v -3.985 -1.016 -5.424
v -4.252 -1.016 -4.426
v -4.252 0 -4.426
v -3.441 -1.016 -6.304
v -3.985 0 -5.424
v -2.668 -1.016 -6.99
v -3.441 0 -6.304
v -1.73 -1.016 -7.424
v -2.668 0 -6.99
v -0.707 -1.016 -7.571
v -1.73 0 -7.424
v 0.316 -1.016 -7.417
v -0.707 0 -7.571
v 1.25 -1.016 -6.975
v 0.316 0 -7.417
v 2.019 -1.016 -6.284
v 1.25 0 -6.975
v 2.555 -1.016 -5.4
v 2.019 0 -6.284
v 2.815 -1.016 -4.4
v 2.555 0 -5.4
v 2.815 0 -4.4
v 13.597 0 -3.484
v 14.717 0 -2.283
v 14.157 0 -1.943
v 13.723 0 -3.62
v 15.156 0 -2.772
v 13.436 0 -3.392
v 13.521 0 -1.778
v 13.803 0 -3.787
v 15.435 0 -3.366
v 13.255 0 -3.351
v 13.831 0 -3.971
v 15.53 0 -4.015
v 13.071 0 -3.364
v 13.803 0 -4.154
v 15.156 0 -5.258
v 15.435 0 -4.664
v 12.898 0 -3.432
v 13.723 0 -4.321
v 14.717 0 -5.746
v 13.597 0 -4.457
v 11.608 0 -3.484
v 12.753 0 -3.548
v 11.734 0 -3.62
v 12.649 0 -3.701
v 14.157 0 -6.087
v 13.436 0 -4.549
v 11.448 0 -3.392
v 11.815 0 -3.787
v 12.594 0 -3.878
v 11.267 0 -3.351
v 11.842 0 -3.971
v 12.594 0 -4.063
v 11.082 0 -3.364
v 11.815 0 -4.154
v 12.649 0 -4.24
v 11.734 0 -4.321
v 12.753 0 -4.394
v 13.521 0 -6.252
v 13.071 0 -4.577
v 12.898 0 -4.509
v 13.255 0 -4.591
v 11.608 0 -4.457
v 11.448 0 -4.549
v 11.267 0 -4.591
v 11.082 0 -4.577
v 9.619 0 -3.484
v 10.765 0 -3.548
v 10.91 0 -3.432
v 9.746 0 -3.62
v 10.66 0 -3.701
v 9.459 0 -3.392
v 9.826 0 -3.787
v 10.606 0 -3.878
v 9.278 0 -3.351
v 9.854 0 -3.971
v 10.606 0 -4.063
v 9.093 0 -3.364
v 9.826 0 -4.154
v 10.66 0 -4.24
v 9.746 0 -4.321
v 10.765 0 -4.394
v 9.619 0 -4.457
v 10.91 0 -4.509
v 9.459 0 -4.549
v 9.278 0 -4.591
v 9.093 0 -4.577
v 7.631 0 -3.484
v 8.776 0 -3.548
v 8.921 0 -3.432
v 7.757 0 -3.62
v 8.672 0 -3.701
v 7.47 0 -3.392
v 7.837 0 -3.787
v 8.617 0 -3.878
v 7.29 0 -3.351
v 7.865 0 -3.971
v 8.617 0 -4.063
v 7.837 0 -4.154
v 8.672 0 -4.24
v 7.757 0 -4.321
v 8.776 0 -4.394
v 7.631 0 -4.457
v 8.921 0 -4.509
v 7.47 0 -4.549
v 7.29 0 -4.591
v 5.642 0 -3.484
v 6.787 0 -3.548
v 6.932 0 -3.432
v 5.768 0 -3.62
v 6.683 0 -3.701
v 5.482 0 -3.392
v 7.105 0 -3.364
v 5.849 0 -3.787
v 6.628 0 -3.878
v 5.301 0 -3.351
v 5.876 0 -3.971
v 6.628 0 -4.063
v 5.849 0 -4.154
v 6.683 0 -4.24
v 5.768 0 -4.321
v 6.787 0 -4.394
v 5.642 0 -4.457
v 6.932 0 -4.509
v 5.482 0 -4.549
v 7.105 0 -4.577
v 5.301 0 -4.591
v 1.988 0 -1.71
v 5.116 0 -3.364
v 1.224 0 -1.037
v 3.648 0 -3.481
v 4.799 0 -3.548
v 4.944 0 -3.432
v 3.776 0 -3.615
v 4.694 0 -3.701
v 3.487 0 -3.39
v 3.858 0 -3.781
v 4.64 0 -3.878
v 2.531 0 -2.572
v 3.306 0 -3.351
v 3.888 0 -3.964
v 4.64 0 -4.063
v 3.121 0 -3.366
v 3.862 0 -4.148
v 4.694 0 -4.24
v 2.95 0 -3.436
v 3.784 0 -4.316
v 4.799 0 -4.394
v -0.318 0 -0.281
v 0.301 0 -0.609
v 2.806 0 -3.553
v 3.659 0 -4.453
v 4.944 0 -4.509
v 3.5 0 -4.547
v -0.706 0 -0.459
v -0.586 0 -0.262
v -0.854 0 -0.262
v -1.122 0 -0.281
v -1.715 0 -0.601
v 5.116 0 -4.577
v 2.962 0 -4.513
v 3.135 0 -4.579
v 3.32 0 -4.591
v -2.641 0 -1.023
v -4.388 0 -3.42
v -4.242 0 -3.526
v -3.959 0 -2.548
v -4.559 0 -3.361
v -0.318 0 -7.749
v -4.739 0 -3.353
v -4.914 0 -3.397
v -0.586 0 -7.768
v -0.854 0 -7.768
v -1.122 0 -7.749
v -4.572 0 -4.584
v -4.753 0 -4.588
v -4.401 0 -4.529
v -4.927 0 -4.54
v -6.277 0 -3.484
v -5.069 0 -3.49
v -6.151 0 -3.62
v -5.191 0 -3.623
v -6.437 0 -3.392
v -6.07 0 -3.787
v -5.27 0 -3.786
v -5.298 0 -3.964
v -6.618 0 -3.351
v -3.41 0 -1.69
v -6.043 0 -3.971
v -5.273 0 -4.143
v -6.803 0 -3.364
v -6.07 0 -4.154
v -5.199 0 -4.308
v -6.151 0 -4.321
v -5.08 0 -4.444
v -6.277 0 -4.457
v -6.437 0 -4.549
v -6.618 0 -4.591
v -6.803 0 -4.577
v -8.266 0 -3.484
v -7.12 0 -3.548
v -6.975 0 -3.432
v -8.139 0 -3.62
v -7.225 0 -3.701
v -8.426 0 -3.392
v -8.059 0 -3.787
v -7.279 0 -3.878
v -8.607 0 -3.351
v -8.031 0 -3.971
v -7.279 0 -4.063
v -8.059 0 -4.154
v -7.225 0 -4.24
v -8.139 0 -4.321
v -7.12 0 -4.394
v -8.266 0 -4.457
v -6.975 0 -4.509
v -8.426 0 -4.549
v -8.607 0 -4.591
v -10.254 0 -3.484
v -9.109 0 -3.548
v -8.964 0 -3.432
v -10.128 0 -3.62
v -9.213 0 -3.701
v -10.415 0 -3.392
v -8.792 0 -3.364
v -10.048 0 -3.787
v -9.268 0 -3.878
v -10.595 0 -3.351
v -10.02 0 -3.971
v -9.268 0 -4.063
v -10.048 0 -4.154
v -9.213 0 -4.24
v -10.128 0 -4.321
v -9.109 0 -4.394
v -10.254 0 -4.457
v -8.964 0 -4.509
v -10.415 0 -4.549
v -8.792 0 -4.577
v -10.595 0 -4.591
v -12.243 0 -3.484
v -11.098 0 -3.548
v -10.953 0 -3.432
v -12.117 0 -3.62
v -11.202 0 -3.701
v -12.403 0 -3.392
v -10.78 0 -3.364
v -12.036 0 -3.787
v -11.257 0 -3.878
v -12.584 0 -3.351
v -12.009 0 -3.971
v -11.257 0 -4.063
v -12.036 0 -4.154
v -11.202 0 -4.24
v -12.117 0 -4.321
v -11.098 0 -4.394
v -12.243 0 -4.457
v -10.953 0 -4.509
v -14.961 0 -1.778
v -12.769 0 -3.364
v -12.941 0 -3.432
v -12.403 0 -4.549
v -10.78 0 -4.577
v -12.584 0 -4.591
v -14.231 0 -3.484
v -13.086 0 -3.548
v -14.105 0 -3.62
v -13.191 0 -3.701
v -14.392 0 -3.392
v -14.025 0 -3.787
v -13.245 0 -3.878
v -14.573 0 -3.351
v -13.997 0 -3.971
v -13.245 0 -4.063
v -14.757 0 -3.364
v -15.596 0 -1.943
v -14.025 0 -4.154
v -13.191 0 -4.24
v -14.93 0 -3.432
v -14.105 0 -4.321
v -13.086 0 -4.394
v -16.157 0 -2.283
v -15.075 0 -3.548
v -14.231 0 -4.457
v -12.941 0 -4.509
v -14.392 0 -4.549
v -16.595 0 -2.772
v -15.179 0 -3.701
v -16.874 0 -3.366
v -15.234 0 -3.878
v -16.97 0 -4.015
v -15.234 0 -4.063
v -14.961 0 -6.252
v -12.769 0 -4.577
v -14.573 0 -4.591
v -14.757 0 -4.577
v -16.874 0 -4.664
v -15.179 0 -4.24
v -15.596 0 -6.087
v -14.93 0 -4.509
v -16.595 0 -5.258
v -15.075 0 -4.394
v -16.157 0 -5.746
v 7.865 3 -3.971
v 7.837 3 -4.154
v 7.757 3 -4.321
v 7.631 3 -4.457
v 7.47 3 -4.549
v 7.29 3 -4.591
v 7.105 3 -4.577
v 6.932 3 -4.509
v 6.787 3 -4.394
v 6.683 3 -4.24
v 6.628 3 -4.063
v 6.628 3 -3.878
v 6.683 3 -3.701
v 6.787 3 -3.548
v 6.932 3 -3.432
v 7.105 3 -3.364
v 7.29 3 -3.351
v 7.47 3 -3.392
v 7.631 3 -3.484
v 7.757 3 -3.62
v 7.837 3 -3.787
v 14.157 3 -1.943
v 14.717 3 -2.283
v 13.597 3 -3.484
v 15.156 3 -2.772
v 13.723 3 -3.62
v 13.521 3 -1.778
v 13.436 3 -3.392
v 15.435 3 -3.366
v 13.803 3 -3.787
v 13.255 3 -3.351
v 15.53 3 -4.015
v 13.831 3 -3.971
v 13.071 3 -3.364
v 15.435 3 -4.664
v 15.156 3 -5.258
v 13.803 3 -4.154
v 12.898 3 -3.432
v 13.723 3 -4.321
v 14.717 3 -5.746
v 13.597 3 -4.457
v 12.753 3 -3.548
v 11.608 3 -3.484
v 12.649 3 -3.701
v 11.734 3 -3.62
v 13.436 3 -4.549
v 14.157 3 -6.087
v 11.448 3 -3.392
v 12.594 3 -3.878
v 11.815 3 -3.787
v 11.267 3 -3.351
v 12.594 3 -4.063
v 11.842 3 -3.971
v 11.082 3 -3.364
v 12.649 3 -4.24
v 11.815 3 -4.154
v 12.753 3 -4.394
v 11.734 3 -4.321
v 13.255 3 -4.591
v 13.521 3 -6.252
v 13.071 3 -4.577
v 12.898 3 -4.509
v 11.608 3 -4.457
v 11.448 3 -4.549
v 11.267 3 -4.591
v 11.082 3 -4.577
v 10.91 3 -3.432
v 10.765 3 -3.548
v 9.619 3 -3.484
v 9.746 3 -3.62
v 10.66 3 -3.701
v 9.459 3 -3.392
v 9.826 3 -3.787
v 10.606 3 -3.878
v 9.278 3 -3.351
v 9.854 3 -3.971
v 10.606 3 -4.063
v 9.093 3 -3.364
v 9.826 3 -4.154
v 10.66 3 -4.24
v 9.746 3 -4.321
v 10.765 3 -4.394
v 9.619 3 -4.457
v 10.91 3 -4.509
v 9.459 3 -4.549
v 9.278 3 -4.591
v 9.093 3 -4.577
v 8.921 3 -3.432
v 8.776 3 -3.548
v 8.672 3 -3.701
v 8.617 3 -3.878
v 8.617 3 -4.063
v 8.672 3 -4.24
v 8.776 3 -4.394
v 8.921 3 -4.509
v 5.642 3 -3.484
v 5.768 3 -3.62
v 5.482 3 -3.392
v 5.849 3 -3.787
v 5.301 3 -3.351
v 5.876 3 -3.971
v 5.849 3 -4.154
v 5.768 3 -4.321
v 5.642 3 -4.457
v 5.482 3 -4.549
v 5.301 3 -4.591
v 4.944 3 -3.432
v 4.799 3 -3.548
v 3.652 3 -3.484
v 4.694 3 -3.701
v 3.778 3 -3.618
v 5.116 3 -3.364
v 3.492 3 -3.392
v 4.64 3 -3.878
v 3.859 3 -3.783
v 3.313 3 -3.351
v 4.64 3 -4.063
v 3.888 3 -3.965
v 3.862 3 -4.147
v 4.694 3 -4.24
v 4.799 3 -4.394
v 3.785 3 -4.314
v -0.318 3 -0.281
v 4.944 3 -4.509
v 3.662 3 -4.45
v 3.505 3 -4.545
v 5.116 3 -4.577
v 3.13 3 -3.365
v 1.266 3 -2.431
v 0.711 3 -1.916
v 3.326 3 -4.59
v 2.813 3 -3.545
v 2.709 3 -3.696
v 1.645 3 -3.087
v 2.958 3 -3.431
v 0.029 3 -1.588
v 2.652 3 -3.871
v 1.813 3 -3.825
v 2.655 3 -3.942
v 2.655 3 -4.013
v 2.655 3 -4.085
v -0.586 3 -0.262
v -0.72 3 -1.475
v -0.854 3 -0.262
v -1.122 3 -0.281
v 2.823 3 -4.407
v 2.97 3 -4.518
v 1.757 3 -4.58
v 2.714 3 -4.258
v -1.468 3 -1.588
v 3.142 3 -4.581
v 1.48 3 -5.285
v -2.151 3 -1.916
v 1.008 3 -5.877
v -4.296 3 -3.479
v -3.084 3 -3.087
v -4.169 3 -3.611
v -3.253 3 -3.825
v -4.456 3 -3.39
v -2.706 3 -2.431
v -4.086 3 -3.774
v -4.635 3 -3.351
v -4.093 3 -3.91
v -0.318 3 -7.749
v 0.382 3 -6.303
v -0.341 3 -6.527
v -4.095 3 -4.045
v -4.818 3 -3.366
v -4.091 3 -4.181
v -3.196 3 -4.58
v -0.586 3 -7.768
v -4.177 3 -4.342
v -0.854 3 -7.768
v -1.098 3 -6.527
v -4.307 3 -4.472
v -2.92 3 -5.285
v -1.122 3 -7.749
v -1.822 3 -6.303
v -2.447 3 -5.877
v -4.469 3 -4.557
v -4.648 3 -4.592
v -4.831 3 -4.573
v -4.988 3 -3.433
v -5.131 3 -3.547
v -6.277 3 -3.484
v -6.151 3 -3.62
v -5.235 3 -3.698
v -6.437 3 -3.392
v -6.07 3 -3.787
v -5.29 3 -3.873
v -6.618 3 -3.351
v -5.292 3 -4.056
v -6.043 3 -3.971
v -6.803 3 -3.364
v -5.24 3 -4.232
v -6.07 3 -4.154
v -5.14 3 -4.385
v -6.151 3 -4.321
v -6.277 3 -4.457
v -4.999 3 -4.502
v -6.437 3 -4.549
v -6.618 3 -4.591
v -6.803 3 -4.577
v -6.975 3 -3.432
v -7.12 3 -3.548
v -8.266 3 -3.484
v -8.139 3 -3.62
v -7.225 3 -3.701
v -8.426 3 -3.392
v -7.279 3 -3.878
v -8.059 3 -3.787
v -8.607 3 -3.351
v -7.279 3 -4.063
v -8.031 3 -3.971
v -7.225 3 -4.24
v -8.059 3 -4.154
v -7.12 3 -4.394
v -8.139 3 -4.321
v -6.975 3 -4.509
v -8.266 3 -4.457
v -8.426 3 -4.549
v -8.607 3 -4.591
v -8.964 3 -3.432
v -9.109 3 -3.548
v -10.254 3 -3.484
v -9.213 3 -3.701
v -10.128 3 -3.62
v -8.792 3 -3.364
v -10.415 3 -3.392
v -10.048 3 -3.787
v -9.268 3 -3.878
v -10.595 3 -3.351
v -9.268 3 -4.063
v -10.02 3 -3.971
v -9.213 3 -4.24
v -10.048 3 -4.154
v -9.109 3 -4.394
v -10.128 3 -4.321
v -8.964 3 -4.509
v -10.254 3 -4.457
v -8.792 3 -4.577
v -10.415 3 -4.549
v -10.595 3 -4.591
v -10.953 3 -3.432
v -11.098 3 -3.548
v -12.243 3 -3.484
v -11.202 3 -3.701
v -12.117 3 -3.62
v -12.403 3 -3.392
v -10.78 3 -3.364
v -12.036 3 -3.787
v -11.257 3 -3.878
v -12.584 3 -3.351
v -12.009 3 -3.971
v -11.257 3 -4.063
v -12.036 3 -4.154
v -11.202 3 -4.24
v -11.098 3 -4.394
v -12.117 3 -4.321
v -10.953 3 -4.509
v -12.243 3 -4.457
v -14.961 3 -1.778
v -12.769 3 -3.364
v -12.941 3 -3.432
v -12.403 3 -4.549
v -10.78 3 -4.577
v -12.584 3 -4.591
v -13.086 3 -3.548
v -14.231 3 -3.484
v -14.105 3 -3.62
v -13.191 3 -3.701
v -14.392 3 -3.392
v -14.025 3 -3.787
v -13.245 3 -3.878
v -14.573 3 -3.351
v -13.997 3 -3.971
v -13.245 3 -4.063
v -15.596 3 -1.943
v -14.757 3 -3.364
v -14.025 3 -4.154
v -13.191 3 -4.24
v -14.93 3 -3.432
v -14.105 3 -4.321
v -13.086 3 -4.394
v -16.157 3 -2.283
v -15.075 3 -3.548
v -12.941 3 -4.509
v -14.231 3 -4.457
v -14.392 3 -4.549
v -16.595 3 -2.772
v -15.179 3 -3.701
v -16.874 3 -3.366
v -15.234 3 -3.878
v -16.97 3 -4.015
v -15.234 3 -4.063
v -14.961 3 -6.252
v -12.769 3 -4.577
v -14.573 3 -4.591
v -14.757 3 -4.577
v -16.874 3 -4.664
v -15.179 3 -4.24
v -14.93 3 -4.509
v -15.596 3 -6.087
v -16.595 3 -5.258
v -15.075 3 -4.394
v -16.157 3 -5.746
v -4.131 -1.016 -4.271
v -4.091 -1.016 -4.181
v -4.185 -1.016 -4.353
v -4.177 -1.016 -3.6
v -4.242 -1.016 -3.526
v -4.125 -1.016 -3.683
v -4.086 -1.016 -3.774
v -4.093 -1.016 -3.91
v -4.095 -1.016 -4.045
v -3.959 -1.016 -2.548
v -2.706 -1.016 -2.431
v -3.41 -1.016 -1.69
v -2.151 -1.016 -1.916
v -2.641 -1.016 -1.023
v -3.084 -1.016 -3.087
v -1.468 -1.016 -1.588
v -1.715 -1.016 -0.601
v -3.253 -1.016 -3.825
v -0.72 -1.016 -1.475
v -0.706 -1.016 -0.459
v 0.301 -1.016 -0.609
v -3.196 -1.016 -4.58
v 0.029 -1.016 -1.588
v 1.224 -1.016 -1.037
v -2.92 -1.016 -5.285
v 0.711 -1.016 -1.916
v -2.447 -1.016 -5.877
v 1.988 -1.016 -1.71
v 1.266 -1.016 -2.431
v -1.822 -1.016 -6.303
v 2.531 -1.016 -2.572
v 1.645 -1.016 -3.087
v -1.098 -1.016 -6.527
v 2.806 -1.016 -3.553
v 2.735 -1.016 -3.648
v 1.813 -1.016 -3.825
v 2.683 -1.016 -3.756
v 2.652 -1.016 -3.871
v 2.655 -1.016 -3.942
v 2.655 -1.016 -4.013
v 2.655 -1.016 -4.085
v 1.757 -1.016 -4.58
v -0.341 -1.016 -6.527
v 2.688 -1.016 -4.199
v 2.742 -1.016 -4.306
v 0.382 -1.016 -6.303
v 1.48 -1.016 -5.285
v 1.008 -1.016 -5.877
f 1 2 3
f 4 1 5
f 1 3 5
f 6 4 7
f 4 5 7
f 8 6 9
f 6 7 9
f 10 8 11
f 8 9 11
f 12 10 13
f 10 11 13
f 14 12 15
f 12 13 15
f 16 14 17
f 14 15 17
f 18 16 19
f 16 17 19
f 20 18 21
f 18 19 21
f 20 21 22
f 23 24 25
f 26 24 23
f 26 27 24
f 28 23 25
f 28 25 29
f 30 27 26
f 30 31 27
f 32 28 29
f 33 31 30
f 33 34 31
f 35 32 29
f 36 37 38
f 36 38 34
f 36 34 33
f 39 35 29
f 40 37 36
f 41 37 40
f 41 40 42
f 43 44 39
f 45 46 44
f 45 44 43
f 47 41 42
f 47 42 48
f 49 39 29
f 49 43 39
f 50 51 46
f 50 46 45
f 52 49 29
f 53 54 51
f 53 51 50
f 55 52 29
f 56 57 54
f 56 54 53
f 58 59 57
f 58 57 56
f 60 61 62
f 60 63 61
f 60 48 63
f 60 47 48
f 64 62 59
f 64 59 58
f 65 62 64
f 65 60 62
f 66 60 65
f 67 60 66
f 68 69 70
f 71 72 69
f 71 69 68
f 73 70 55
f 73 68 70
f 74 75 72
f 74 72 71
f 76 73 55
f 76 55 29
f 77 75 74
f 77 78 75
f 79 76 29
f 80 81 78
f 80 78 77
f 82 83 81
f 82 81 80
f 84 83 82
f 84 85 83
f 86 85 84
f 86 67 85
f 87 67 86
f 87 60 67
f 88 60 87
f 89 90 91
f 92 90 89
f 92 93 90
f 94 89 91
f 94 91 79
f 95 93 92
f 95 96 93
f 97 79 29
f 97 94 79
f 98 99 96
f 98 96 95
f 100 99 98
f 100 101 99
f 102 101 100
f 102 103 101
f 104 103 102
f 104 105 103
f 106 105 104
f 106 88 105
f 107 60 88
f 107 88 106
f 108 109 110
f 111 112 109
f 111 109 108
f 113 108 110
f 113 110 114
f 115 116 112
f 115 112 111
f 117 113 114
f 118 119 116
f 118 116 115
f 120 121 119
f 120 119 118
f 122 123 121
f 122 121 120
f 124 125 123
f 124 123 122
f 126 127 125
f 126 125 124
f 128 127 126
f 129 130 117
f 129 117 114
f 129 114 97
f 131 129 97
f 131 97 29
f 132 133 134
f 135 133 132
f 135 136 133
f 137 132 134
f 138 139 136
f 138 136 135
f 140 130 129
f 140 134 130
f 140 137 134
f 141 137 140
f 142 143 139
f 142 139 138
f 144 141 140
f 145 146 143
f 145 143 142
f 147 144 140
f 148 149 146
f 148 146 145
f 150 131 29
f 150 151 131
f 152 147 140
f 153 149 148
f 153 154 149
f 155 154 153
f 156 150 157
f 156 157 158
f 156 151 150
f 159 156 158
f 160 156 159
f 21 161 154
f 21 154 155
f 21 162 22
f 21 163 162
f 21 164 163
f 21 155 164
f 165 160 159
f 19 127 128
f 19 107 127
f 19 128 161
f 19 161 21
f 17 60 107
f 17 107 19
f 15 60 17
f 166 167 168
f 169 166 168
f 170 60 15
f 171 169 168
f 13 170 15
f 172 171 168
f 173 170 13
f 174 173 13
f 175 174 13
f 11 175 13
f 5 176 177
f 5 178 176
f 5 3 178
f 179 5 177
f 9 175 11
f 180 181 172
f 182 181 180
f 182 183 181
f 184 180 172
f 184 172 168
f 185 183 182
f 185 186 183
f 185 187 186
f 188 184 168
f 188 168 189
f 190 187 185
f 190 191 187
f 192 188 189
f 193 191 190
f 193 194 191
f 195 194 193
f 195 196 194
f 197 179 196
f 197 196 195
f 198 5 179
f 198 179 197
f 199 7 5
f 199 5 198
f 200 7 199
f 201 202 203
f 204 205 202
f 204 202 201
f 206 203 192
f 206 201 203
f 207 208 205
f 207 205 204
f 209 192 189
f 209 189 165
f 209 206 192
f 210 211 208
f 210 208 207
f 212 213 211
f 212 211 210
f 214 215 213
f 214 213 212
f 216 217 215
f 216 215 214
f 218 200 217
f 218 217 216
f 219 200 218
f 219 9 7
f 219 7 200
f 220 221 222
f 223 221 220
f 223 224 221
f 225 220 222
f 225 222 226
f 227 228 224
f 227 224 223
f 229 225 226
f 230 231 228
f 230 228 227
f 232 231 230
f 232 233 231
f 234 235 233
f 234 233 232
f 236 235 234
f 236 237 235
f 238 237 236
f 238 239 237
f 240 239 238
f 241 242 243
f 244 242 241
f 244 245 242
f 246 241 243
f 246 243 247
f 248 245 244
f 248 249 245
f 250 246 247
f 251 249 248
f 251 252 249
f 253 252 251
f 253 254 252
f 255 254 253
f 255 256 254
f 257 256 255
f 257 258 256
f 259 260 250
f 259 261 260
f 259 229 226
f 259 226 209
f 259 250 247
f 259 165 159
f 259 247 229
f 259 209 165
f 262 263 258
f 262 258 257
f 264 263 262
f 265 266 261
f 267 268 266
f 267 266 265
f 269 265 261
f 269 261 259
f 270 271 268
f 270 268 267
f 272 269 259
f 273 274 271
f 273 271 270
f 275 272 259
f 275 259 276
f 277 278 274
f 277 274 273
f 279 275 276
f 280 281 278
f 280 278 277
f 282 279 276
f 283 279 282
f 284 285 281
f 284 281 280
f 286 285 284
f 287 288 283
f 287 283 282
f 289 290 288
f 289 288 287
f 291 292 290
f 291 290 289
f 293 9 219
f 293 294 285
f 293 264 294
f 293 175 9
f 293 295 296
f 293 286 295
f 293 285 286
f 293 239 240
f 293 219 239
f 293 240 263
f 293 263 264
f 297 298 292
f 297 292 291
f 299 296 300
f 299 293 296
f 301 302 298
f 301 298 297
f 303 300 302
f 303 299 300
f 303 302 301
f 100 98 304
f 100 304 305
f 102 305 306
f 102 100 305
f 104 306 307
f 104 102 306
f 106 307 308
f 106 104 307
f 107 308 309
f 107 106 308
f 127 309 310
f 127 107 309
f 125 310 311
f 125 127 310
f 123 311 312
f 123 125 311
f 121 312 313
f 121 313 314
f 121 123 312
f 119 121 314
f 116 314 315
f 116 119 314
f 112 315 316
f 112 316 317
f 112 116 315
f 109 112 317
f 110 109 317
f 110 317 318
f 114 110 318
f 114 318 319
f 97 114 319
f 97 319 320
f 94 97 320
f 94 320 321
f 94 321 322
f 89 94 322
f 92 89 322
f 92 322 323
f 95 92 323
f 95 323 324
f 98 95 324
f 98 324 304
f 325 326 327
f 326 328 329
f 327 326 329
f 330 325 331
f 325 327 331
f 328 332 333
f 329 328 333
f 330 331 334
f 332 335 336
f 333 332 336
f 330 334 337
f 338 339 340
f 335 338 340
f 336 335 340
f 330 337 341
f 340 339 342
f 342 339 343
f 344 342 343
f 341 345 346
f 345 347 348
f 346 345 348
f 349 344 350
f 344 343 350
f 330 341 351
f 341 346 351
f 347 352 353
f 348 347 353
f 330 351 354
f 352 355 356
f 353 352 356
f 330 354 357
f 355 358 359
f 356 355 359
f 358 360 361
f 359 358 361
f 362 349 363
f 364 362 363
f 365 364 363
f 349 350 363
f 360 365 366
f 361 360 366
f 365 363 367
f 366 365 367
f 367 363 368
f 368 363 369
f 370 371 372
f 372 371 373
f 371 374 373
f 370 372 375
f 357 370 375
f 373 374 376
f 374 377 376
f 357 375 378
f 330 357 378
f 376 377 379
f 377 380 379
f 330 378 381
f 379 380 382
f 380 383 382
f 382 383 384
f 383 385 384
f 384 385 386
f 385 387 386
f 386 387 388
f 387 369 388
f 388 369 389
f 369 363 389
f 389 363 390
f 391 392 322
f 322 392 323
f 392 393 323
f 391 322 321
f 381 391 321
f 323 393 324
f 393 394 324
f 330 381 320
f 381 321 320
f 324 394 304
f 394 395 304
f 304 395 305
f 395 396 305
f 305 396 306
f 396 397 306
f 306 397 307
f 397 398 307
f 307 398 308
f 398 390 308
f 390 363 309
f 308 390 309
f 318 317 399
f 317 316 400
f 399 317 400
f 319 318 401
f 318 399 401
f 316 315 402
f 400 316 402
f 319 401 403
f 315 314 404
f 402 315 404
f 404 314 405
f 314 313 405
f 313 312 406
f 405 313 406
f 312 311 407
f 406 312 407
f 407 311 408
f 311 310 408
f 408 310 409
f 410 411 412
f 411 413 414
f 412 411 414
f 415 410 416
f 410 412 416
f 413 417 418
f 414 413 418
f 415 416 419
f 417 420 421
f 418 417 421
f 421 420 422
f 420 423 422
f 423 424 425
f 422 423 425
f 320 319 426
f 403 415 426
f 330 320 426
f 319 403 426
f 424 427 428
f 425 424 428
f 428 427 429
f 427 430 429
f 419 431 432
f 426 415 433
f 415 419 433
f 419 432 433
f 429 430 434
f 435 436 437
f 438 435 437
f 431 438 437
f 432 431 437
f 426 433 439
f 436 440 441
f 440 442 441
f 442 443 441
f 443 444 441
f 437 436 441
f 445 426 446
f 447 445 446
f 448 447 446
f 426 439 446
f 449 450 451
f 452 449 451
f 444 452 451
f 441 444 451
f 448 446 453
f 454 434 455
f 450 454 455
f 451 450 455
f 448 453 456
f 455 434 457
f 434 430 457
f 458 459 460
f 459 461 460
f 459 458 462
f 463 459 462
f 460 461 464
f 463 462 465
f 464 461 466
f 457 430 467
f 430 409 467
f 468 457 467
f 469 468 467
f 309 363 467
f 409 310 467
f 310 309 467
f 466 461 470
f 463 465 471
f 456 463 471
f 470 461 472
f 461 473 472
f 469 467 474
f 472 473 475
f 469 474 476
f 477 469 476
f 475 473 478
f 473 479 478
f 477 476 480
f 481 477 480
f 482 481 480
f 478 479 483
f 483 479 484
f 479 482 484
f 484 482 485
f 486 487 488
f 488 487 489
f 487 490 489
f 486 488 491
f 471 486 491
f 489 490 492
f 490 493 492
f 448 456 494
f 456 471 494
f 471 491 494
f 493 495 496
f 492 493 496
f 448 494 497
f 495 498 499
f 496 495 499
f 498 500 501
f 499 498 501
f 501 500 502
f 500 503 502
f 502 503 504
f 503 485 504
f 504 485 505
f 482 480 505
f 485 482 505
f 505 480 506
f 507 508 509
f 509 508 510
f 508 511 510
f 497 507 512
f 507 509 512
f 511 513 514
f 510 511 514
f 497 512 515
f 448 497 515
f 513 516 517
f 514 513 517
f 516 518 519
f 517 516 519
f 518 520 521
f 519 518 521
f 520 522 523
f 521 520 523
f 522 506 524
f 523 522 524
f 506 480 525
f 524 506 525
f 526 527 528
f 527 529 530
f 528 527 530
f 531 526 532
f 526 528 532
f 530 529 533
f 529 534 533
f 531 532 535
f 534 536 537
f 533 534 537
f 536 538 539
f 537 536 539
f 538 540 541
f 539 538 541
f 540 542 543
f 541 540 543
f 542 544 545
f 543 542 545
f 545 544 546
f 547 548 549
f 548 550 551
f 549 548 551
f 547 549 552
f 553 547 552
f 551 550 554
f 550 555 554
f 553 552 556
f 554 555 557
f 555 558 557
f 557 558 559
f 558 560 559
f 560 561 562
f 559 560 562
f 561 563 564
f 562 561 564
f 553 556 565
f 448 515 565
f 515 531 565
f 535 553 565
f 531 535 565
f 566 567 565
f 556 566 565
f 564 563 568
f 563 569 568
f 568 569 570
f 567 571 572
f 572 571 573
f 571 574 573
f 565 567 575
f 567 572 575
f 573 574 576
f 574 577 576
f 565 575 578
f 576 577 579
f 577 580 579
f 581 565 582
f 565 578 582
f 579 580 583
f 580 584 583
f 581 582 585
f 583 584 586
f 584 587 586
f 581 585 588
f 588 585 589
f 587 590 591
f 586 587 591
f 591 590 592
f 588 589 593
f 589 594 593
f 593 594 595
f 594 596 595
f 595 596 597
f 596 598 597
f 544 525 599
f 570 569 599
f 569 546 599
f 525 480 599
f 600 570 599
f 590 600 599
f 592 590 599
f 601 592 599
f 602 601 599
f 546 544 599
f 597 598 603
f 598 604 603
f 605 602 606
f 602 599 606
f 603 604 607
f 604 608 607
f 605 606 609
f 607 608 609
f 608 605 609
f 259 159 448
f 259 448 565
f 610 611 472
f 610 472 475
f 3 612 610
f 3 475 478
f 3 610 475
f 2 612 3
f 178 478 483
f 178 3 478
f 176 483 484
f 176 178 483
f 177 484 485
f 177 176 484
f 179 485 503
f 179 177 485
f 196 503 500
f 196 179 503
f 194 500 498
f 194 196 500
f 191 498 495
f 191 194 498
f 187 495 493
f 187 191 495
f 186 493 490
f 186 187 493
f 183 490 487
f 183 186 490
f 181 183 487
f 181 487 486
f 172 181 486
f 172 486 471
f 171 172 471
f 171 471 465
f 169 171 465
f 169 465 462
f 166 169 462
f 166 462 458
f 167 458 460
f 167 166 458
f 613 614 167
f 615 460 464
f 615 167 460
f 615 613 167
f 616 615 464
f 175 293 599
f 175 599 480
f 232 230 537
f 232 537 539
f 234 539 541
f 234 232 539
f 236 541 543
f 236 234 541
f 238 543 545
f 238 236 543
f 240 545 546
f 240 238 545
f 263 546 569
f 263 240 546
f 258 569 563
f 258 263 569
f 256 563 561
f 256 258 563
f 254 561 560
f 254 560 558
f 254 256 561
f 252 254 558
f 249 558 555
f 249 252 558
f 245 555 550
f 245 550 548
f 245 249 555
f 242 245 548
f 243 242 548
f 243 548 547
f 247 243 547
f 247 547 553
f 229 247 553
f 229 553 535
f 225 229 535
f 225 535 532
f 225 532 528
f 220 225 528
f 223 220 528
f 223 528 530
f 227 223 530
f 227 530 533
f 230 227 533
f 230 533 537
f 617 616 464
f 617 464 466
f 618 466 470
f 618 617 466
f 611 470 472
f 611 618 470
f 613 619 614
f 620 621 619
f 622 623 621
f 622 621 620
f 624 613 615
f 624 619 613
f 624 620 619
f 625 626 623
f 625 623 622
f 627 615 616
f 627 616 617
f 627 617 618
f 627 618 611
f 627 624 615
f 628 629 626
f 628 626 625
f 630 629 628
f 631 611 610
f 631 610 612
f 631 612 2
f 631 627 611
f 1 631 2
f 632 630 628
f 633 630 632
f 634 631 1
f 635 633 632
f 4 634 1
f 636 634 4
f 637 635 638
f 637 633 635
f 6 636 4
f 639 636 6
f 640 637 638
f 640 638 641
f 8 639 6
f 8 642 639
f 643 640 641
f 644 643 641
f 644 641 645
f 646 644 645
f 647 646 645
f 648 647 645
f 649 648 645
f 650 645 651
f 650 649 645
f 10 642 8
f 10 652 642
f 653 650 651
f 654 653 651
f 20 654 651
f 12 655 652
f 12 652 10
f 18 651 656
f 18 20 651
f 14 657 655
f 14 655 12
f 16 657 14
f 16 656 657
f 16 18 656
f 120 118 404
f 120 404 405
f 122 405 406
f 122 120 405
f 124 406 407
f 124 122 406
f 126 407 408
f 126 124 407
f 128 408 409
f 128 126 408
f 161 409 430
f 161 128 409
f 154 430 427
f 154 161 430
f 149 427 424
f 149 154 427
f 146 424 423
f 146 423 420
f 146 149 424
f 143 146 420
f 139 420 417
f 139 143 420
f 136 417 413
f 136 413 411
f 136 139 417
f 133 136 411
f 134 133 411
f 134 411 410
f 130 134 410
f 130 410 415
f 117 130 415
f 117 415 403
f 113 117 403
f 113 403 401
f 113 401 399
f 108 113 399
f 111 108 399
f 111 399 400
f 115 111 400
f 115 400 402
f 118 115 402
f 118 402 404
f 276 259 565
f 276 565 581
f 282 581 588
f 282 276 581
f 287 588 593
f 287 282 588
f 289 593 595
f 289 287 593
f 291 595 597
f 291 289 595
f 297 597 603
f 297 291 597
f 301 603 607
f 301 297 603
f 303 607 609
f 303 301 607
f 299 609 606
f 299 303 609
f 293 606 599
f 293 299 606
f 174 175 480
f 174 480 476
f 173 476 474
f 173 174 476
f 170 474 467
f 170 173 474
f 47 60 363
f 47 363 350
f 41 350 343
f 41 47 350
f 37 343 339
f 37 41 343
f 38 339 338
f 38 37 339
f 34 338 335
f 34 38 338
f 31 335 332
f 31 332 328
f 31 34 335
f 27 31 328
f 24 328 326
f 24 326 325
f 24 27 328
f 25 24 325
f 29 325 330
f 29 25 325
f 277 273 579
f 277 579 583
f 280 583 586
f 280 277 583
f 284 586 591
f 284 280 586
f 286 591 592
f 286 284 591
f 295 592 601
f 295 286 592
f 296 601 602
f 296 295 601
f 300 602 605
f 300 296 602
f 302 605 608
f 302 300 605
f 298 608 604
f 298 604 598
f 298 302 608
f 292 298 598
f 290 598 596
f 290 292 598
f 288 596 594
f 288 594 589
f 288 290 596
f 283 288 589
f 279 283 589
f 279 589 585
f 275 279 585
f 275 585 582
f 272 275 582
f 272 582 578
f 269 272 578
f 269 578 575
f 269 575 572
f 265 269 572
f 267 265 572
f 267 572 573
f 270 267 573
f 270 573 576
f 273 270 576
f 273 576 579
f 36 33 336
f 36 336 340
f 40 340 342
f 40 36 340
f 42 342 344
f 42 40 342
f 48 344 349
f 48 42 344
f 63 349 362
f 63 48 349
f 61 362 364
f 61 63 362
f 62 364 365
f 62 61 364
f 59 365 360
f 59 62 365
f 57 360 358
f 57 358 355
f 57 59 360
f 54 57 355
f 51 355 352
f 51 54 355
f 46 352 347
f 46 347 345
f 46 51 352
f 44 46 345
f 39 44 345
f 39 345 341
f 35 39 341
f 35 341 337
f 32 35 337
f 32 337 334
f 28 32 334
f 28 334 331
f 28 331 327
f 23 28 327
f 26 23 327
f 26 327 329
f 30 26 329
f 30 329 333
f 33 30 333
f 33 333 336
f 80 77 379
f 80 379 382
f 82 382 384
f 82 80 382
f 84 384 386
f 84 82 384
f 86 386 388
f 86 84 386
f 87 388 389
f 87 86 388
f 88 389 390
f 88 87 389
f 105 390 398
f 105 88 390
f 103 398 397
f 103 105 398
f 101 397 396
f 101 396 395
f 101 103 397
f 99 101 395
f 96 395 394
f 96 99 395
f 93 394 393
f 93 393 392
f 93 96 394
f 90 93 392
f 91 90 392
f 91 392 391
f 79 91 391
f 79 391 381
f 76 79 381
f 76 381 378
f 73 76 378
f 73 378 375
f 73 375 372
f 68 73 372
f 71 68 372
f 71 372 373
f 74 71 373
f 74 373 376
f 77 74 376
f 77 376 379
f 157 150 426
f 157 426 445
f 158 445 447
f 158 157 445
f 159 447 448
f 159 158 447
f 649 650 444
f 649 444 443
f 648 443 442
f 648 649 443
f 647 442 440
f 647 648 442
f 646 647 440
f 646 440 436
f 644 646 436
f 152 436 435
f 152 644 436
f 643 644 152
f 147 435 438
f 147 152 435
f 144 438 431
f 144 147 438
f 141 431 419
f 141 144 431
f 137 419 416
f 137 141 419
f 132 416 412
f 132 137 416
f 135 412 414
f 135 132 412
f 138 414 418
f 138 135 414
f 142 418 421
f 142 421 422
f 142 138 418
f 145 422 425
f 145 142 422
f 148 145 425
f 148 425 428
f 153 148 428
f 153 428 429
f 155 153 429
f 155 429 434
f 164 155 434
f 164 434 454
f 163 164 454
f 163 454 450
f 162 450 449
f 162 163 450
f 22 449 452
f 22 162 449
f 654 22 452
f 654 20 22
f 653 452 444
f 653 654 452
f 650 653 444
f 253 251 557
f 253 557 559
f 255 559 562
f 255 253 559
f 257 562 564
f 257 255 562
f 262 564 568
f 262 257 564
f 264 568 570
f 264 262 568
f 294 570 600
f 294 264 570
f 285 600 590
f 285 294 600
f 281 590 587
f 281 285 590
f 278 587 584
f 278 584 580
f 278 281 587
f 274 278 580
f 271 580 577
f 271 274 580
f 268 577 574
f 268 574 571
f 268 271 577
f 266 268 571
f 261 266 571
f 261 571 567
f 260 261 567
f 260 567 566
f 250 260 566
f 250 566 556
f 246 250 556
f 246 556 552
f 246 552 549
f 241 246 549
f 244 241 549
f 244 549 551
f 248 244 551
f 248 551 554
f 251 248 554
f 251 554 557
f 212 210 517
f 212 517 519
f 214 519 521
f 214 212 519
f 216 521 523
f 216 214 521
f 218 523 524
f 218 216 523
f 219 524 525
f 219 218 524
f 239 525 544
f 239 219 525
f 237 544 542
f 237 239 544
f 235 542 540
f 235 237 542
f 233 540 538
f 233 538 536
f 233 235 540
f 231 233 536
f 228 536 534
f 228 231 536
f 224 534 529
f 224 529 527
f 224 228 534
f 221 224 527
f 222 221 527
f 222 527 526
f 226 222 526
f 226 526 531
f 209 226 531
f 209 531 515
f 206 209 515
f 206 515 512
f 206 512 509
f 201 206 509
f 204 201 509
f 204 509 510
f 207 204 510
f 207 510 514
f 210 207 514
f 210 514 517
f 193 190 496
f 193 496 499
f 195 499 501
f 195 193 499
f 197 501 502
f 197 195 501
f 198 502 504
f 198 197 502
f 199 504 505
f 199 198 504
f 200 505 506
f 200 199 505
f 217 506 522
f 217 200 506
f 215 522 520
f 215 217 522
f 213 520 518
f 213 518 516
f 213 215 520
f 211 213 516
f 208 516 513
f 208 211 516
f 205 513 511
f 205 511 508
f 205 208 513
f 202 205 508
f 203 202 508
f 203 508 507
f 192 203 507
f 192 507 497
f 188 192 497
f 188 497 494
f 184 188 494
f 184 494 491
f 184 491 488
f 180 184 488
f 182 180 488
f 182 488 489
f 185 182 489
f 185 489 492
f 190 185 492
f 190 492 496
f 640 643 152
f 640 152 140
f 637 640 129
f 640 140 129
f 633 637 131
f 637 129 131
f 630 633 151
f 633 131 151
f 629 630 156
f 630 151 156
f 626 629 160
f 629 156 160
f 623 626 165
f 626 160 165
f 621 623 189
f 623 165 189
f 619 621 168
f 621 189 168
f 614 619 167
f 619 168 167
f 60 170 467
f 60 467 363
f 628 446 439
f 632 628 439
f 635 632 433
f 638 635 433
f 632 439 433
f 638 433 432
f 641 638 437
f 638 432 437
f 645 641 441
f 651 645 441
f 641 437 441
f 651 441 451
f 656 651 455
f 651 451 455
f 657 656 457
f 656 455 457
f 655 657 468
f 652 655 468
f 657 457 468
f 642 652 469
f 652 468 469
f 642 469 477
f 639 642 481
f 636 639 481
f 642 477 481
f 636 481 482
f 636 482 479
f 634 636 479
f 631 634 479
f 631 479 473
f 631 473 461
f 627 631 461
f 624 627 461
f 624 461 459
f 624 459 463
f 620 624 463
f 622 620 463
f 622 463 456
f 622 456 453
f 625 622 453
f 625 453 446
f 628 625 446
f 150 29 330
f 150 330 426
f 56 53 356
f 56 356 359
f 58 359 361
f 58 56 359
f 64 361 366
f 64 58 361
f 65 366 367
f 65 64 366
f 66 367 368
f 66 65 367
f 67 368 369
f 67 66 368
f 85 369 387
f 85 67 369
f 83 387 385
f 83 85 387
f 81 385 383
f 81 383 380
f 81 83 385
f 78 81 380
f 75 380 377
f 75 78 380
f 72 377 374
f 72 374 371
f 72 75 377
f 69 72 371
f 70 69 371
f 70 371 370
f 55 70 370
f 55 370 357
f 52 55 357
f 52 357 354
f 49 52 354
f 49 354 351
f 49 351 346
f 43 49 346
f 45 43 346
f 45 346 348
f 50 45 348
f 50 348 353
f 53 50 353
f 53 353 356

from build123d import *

# Parameters (mm, degrees)
BOSS_EXTRUDE1_DEPTH     = 2.999994
SKETCH3_R               = 3.375082345
SKETCH3_R_2             = 2.3700486
BOSS_EXTRUDE2_DEPTH     = 3.302
SKETCH4_R               = 2.3700486
SKETCH4_R_2             = 1.524
BOSS_EXTRUDE3_DEPTH     = 2.237994
SKETCH5_R               = 3.556
SKETCH5_R_2             = 1.524049463
BOSS_EXTRUDE4_DEPTH     = 1.016
SKETCH6_R               = 1.524049463
CUT_EXTRUDE2_DEPTH      = 20.69939547
CUT_EXTRUDE3_START      = -4.015994
CUT_EXTRUDE3_OUTLINE_R  = 0.621776252
CUT_EXTRUDE3_DEPTH      = 4.015994
CUT_EXTRUDE4_DEPTH      = 21.047545727
CUT_EXTRUDE4_DEPTH_BACK = 3.302
SKETCH9_R               = 3.375082345
SKETCH10_R              = 2.54
CUT_EXTRUDE5_DEPTH      = 20.091339956


# Read off the part's stored shape, not the designer's step: Cut-Extrude3
with BuildPart() as part:
    # Sketch1 → Boss-Extrude1 (new body)
    with BuildSketch(Plane(origin=(0, 0, 0), x_dir=(1, 0, 0), z_dir=(0, 1, 0))):
        with BuildLine():
            Line((-14.960824333, 6.251943389), (-1.121532733, 7.748689189))
            ThreePointArc((-1.121532733, 7.748689189), (-0.719755533, 7.770352511), (-0.317978333, 7.748689189))
            Line((-0.317978333, 7.748689189), (13.521313267, 6.251943389))
            ThreePointArc((13.521313267, 6.251943389), (15.530246603, 4.014889189), (13.521313267, 1.777834989))
            Line((13.521313267, 1.777834989), (-0.317978333, 0.281089189))
            ThreePointArc((-0.317978333, 0.281089189), (-0.719755533, 0.259425867), (-1.121532733, 0.281089189))
            Line((-1.121532733, 0.281089189), (-14.960824333, 1.777834989))
            ThreePointArc((-14.960824333, 1.777834989), (-16.96975767, 4.014889189), (-14.960824333, 6.251943389))
        make_face()
    extrude(amount=BOSS_EXTRUDE1_DEPTH)

    # Sketch3 → Boss-Extrude2 (add)
    with BuildSketch(Plane(origin=(0, 2.999994, 0), x_dir=(1, 0, 0), z_dir=(0, 1, 0))):
        with Locations(Location((-0.719755307, 4.013536412, 0), (0, 0, 90))):
            Circle(SKETCH3_R)
        with Locations(Location((-0.719755307, 4.013536412, 0), (0, 0, 90))):
            Circle(SKETCH3_R_2, mode=Mode.SUBTRACT)
    extrude(amount=BOSS_EXTRUDE2_DEPTH)

    # Sketch4 → Boss-Extrude3 (add)
    with BuildSketch(Plane.XZ):
        with Locations(Location((-0.719755307, -4.013536412, 0), (0, 0, 270))):
            Circle(SKETCH4_R)
        with Locations((-0.719755307, -4.013536412)):
            Circle(SKETCH4_R_2, mode=Mode.SUBTRACT)
    extrude(amount=-BOSS_EXTRUDE3_DEPTH)

    # Sketch5 → Boss-Extrude4 (add)
    with BuildSketch(Plane.XZ):
        with Locations(Location((-0.7197993, -4.014912249, 0), (0, 0, 270))):
            Circle(SKETCH5_R)
        with Locations(Location((-0.7197993, -4.014912249, 0), (0, 0, 270))):
            Circle(SKETCH5_R_2, mode=Mode.SUBTRACT)
    extrude(amount=BOSS_EXTRUDE4_DEPTH)

    # Sketch6 → Cut-Extrude2 (cut, through all)
    with BuildSketch(Plane.XZ):
        with Locations(Location((-0.7197993, -4.014912249, 0), (0, 0, 270))):
            Circle(SKETCH6_R)
    extrude(amount=-CUT_EXTRUDE2_DEPTH, mode=Mode.SUBTRACT)

    # Cut-Extrude3 outline → Cut-Extrude3 (cut)
    with BuildSketch(Plane(origin=(0, 2.999994, 0), x_dir=(1, 0, 0), z_dir=(0, 1, 0)).offset(CUT_EXTRUDE3_START)):
        with BuildLine():
            ThreePointArc((-4.086322125, 3.773935294), (-4.094643941, 3.977376451), (-4.090683041, 4.18094921))
            ThreePointArc((-4.090683041, 4.18094921), (-5.297734637, 3.964486038), (-4.086322125, 3.773935294))
        make_face()
        with BuildLine():
            ThreePointArc((2.654580903, 4.084501036), (2.655136179, 3.977643639), (2.652308378, 3.870822222))
            ThreePointArc((2.652308378, 3.870822222), (3.887678446, 3.964535259), (2.654580903, 4.084501036))
        make_face()
        with Locations((-6.664608508, 3.970614789)):
            Circle(CUT_EXTRUDE3_OUTLINE_R)
        with Locations((9.231780819, 3.970614789)):
            Circle(CUT_EXTRUDE3_OUTLINE_R)
        with Locations((11.220395333, 3.970614789)):
            Circle(CUT_EXTRUDE3_OUTLINE_R)
        with Locations((13.209009847, 3.970614789)):
            Circle(CUT_EXTRUDE3_OUTLINE_R)
        with Locations((7.243166305, 3.970614789)):
            Circle(CUT_EXTRUDE3_OUTLINE_R)
        with Locations((5.254551791, 3.970614789)):
            Circle(CUT_EXTRUDE3_OUTLINE_R)
        with Locations((-14.619066564, 3.970614789)):
            Circle(CUT_EXTRUDE3_OUTLINE_R)
        with Locations((-12.63045205, 3.970614789)):
            Circle(CUT_EXTRUDE3_OUTLINE_R)
        with Locations((-10.641837536, 3.970614789)):
            Circle(CUT_EXTRUDE3_OUTLINE_R)
        with Locations((-8.653223022, 3.970614789)):
            Circle(CUT_EXTRUDE3_OUTLINE_R)
    extrude(amount=CUT_EXTRUDE3_DEPTH, mode=Mode.SUBTRACT)

    # Sketch9 → Cut-Extrude4 (cut, two sides: drawn at the far end of the back side and taken through both)
    with BuildSketch(Plane(origin=(0, 6.301994, 0), x_dir=(1, 0, 0), z_dir=(0, 1, 0)).offset(-CUT_EXTRUDE4_DEPTH_BACK)):
        with Locations((-0.719755307, 4.013536412)):
            Circle(SKETCH9_R)
    extrude(amount=CUT_EXTRUDE4_DEPTH + CUT_EXTRUDE4_DEPTH_BACK, mode=Mode.SUBTRACT)

    # Sketch10 → Cut-Extrude5 (cut, through all)
    with BuildSketch(Plane(origin=(0, 2.999994, 0), x_dir=(1, 0, 0), z_dir=(0, 1, 0))):
        with Locations(Location((-0.7197993, 4.014912249, 0), (0, 0, 270))):
            Circle(SKETCH10_R)
    extrude(amount=-CUT_EXTRUDE5_DEPTH, mode=Mode.SUBTRACT)


solid = part.part
